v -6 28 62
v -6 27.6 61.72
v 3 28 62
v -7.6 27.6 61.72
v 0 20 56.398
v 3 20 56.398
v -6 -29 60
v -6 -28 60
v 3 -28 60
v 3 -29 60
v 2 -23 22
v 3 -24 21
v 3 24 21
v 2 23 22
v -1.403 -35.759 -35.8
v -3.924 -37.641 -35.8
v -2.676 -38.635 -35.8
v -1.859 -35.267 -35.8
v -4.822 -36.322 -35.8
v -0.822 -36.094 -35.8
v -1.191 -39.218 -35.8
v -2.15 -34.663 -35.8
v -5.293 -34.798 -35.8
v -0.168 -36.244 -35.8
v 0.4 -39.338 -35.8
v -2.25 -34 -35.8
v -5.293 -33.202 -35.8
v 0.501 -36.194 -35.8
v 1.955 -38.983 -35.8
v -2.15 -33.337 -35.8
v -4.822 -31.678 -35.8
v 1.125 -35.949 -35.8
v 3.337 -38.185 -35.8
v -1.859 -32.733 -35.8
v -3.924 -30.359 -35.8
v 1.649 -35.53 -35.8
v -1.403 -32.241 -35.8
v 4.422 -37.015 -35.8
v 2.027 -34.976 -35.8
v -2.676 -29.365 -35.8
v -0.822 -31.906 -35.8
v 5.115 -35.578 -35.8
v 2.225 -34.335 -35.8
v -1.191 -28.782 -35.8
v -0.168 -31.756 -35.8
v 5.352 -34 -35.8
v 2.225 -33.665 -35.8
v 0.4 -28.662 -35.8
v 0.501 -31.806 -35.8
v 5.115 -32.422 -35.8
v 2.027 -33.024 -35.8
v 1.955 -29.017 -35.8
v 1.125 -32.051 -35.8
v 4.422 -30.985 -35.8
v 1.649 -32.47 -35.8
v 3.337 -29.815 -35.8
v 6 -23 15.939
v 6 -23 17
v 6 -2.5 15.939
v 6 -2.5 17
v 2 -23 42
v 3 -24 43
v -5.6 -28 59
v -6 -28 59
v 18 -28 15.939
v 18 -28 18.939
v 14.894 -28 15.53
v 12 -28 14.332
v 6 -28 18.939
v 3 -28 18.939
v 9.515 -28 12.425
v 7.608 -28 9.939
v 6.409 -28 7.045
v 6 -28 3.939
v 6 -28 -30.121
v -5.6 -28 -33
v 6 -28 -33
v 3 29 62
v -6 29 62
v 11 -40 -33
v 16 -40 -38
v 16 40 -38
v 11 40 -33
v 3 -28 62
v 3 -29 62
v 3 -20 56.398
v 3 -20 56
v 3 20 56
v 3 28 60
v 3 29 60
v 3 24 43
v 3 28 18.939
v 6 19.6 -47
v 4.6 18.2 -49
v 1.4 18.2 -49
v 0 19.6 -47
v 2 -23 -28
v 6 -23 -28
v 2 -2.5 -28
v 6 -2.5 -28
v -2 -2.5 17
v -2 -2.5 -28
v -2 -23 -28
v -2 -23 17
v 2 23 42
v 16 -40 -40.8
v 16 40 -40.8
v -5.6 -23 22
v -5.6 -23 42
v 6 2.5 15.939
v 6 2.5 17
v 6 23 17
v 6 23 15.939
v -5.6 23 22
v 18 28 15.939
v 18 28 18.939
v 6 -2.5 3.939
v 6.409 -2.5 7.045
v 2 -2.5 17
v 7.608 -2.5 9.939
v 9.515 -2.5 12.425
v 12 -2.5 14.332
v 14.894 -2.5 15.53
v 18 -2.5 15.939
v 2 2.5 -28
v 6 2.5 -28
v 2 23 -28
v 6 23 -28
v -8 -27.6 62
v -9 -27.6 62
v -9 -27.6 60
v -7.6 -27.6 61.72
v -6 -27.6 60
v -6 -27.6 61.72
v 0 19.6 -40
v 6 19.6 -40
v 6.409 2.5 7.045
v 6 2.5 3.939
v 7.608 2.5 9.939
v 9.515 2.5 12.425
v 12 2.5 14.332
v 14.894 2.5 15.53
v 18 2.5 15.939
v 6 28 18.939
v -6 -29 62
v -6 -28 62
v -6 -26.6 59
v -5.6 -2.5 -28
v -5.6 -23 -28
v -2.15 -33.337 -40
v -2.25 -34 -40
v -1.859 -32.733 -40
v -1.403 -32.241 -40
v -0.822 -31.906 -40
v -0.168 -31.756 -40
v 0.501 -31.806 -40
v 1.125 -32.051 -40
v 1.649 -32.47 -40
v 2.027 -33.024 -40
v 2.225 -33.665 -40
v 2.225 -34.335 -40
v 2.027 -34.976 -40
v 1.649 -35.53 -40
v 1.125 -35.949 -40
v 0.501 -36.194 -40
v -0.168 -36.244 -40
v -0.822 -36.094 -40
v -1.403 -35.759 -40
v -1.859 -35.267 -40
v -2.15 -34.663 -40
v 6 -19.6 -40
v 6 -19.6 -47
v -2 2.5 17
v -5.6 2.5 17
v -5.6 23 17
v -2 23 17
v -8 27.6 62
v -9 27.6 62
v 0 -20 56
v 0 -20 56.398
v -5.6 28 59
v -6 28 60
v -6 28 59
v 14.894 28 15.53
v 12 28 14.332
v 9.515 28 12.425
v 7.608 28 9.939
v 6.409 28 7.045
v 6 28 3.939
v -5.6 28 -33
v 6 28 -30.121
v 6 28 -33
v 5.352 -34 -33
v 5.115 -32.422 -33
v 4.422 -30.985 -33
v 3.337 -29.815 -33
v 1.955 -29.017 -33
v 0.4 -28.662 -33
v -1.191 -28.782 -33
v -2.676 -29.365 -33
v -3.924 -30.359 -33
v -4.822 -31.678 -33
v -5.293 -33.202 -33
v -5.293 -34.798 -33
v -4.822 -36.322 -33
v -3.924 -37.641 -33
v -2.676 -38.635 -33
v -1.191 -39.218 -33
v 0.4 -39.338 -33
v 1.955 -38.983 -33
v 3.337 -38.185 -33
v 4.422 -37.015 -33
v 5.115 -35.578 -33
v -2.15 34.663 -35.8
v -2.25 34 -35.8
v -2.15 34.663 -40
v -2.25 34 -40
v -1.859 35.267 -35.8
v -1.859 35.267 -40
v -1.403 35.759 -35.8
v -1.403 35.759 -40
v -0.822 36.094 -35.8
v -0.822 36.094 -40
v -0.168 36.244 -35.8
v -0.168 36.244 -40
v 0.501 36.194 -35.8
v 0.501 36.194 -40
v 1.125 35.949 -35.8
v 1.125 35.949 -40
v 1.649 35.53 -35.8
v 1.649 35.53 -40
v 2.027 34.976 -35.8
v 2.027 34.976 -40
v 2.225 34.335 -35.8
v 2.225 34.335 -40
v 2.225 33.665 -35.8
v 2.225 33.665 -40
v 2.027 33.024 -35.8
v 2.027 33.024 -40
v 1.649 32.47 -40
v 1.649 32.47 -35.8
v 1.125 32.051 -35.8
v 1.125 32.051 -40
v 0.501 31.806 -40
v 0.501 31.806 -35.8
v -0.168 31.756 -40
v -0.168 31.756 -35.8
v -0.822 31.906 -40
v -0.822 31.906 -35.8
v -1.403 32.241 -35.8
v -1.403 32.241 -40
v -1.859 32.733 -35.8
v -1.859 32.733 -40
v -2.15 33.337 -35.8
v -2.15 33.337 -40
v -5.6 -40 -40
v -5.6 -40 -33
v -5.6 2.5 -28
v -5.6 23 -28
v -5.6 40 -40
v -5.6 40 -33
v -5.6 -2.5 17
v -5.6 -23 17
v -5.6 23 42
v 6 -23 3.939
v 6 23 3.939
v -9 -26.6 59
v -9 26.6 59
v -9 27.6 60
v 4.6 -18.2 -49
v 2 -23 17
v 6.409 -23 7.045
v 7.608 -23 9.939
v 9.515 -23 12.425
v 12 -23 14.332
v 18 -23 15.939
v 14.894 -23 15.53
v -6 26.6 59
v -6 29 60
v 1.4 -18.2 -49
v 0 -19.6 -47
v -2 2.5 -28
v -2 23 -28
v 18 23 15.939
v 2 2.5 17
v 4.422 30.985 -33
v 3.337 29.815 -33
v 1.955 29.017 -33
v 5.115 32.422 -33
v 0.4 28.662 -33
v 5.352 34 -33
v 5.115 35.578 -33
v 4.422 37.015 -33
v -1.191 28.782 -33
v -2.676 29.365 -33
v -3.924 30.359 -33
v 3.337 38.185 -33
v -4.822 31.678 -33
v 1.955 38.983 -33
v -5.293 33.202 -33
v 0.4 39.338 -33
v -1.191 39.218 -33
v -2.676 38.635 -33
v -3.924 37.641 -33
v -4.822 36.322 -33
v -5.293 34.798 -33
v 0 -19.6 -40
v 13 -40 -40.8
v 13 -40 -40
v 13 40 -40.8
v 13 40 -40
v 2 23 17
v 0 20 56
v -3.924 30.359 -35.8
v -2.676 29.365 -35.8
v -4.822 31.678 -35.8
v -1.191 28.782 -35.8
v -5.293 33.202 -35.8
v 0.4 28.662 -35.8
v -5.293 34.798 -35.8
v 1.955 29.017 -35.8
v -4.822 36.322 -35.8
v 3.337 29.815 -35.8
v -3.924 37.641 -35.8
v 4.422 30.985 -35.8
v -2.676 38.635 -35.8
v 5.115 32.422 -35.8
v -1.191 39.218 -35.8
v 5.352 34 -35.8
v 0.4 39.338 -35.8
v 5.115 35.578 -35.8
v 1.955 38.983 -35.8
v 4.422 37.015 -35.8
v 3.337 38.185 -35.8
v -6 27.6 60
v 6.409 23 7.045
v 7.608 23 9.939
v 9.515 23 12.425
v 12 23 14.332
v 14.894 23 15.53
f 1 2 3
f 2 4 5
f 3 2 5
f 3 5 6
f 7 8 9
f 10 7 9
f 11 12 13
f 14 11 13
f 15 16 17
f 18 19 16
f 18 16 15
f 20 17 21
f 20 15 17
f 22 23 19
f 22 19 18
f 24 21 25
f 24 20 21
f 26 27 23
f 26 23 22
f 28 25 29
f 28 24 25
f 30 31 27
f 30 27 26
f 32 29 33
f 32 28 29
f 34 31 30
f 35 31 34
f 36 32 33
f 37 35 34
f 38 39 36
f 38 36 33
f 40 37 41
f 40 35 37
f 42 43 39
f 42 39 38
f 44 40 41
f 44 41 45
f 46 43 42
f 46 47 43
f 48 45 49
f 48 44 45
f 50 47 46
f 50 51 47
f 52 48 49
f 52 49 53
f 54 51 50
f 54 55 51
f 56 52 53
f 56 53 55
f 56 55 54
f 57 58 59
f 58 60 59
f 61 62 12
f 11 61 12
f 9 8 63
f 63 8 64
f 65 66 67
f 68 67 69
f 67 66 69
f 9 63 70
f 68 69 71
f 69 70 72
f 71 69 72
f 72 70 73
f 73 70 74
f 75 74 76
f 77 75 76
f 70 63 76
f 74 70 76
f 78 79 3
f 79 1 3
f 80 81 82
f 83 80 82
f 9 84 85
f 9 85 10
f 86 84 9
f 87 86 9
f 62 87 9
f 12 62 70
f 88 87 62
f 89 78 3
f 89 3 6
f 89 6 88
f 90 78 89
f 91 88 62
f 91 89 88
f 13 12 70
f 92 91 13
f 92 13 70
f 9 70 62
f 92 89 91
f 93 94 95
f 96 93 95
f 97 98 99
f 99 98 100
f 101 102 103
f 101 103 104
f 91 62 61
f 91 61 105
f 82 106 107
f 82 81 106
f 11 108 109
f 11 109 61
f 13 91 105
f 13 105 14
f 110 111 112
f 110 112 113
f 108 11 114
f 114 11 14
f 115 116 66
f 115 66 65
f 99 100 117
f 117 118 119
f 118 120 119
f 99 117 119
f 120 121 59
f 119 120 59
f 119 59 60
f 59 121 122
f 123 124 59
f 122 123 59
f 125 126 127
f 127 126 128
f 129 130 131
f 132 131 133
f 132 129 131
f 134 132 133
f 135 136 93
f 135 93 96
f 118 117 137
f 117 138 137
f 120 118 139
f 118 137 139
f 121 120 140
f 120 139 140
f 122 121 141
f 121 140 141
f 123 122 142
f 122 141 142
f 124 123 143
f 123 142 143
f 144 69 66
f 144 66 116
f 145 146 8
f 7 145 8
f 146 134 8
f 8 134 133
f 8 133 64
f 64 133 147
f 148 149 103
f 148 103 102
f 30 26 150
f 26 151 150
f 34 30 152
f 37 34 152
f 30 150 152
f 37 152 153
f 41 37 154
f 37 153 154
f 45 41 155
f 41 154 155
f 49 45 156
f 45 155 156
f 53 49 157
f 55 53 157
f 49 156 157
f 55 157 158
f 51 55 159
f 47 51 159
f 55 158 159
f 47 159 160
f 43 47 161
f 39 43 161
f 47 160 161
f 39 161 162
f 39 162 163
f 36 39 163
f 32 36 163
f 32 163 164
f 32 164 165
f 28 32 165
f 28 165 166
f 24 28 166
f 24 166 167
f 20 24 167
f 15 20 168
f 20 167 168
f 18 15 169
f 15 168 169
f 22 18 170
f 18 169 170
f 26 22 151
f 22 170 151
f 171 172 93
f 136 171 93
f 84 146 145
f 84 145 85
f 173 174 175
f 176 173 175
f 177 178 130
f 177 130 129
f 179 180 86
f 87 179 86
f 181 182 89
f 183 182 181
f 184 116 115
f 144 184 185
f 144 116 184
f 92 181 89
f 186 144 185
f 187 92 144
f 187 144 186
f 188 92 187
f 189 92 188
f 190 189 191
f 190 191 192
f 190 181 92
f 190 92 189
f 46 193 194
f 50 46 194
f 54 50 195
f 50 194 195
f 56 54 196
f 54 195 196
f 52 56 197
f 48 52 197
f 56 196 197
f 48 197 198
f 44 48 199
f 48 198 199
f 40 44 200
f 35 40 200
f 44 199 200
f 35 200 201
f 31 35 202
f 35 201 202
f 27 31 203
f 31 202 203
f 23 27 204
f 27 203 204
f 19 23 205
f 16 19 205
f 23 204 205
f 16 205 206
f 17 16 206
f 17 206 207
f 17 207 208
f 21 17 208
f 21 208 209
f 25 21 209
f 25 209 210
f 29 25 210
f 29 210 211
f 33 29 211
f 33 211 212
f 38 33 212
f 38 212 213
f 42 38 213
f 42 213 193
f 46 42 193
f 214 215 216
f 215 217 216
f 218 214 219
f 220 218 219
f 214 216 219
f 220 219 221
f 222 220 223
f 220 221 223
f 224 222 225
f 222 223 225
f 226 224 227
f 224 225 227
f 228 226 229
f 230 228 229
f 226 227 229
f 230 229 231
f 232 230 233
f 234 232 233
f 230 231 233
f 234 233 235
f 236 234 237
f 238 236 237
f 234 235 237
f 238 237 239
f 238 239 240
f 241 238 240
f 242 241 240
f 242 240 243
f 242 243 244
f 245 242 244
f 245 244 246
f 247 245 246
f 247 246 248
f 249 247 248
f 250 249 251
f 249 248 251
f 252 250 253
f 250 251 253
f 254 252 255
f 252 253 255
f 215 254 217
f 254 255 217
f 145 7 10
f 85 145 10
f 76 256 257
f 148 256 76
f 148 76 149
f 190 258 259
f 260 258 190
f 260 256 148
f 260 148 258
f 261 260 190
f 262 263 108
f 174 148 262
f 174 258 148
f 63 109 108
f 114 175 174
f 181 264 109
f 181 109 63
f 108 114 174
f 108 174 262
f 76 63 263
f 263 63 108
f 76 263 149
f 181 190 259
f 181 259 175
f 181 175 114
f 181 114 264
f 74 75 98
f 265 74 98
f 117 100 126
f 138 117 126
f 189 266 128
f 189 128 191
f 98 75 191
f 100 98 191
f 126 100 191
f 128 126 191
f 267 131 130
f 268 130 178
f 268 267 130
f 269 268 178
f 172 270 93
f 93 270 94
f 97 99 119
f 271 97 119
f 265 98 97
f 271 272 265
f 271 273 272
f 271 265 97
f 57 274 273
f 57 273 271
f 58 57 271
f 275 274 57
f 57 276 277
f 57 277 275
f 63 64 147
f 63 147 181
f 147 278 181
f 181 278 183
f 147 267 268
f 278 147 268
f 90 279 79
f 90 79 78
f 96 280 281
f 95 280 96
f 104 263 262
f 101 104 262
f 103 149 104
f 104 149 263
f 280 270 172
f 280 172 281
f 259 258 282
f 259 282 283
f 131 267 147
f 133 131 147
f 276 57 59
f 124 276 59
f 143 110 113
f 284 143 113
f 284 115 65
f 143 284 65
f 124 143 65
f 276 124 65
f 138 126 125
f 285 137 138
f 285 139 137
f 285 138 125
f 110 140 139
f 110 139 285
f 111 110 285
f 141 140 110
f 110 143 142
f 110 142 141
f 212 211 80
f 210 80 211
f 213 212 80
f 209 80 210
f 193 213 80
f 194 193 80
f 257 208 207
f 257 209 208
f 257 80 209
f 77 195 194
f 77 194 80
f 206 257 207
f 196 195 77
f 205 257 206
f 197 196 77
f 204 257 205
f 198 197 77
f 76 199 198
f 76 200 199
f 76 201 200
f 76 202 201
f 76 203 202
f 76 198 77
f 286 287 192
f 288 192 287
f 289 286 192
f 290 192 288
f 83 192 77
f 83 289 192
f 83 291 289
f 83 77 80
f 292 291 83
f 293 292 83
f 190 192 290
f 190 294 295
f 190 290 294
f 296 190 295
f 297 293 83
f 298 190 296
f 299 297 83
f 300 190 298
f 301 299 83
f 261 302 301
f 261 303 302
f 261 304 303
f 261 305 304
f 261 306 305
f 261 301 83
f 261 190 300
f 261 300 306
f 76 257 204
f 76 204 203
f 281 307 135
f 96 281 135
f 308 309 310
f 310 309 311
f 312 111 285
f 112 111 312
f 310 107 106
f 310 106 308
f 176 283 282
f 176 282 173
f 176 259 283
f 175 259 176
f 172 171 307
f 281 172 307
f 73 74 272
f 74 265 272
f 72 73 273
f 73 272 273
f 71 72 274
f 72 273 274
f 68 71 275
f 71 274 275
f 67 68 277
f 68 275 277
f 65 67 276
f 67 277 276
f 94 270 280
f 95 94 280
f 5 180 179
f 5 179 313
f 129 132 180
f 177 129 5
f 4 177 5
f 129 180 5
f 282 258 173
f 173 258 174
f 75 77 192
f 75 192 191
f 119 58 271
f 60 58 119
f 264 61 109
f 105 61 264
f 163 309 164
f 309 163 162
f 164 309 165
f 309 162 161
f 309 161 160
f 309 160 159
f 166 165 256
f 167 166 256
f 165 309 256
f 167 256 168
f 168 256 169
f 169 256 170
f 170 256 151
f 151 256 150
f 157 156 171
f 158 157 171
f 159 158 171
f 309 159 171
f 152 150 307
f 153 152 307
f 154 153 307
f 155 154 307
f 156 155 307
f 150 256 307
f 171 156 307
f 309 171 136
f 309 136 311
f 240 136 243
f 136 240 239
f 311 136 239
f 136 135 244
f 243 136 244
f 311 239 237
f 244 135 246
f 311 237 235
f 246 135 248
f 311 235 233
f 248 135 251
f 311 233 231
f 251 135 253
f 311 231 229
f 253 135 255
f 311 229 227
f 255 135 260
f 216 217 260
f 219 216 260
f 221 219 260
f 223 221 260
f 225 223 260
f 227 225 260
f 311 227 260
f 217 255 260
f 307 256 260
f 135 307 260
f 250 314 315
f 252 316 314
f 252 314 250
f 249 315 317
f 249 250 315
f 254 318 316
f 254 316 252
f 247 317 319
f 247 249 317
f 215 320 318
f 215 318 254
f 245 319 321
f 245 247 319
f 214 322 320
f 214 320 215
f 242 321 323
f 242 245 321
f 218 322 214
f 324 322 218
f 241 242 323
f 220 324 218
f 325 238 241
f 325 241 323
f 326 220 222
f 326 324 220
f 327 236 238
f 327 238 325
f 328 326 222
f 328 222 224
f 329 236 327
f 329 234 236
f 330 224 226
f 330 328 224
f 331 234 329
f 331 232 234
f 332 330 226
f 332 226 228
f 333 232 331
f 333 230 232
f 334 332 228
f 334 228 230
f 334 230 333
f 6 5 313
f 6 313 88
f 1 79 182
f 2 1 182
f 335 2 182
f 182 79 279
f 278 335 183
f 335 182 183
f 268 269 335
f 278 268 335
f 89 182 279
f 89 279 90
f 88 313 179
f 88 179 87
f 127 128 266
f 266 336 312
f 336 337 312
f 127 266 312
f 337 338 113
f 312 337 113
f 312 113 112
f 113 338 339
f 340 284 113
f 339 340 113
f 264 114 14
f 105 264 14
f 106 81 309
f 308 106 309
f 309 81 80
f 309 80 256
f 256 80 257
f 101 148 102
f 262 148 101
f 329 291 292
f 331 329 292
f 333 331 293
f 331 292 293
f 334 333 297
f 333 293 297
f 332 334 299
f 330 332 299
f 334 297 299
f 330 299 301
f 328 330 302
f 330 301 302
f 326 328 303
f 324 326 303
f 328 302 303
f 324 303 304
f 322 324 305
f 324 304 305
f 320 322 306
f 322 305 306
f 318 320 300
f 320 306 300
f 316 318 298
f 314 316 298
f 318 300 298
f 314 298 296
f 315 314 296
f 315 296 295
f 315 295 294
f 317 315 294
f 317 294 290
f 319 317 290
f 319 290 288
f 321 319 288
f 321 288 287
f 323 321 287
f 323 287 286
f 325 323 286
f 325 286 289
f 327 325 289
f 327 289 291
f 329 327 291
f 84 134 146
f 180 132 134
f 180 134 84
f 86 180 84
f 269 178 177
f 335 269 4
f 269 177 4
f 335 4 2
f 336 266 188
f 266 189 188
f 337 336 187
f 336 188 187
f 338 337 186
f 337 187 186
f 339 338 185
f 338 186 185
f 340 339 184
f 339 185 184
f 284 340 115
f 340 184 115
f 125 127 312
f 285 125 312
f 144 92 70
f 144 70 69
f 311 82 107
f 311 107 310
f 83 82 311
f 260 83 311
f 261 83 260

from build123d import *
from OCP.BRepFilletAPI import BRepFilletAPI_MakeChamfer

# Parameters (mm, degrees)
SKETCH_1_W          = 12
SKETCH_1_H          = 46
EXTRUDE_1_DEPTH     = 59
SKETCH_2_W          = 20
SKETCH_2_H          = 46.080872769
CUT_EXTRUDE_1_DEPTH = 60
SKETCH_3_W          = 12
SKETCH_3_H          = 59
EXTRUDE_2_DEPTH     = 5
SKETCH_4_W          = 12
SKETCH_4_H          = 56
EXTRUDE_3_DEPTH     = 40
SKETCH_5_W          = 12
SKETCH_5_H          = 7
EXTRUDE_4_DEPTH     = 12
M4_A_1_D            = 4.5
M4_A_1_CBORE_D      = 10.705
M4_A_1_CBORE_DEPTH  = 2.8
SKETCH_8_W          = 15
SKETCH_8_H          = 56
EXTRUDE_5_DEPTH     = 3
SKETCH_9_W          = 6
SKETCH_9_H          = 40
CUT_EXTRUDE_2_DEPTH = 6
CHAMFER_1_SIZE      = 8
CHAMFER_1_SIZE_2    = 5.601660306
SKETCH_10_W         = 6
SKETCH_10_H         = 39.2
EXTRUDE_6_DEPTH     = 9
SKETCH_11_W         = 3
SKETCH_11_H         = 0.4
CUT_EXTRUDE_3_DEPTH = 119.330046903
CHAMFER_2_SIZE      = 1
CHAMFER_3_SIZE      = 2
CHAMFER_3_SIZE2     = 1.400415076
SKETCH_12_W         = 45
SKETCH_12_H         = 20.5
CUT_EXTRUDE_4_DEPTH = 4
SKETCH_14_W         = 7
SKETCH_14_H         = 80
EXTRUDE_7_DEPTH     = 10
CUT_EXTRUDE_5_DEPTH = 103.46950766
SKETCH_16_W         = 3
SKETCH_16_H         = 56
EXTRUDE_8_DEPTH     = 12
CHAMFER_5_SIZE      = 5
CUT_EXTRUDE_START   = -43.060641
SKETCH_17_W         = 3
SKETCH_17_H         = 56
CUT_EXTRUDE_6_DEPTH = 43.060641
CHAMFER_4_SIZE      = 1
FILLET_1_R          = 12
SKETCH_22_W         = 3
SKETCH_22_H         = 80
EXTRUDE_11_DEPTH    = 0.8
SKETCH_24_W         = 9
SKETCH_24_H         = 2
EXTRUDE_13_DEPTH    = 1
SKETCH_26_W         = 99
SKETCH_26_H         = 80
CUT_EXTRUDE_8_DEPTH = 0.4


with BuildPart() as part:
    # 스케치1 → 보스-돌출1 (new body)
    with BuildSketch(Plane.XY):
        Rectangle(SKETCH_1_W, SKETCH_1_H)
    extrude(amount=EXTRUDE_1_DEPTH)

    # 스케치2 → 컷-돌출1 (cut)
    with BuildSketch(Plane(origin=(6, 0, 0), x_dir=(0, 0, -1), z_dir=(1, 0, 0))):
        with Locations((-32, 0.040436385)):
            Rectangle(SKETCH_2_W, SKETCH_2_H)
    extrude(amount=-CUT_EXTRUDE_1_DEPTH, mode=Mode.SUBTRACT)


with BuildPart() as cut_extrude_1_piece_1:
    # of the separate pieces the step leaves, piece 1, a body of its own (cut_extrude_1_pieces)
    add(part.part.solids().sort_by_distance((-6, 23, 0))[0])



with BuildPart() as cut_extrude_1_piece_2:
    # of the separate pieces the step leaves, piece 2, a body of its own (cut_extrude_1_pieces)
    add(part.part.solids().sort_by_distance((6, 23, 42))[0])


with BuildPart() as cut_extrude_1_piece_1_1:
    add(cut_extrude_1_piece_1.part)

    add(cut_extrude_1_piece_2.part)  # 보스-돌출2 merges 컷-돌출1 piece 2
    # 스케치3 → 보스-돌출2 (add)
    with BuildSketch(Plane.XZ.offset(23)):
        with Locations((0, 29.5)):
            Rectangle(SKETCH_3_W, SKETCH_3_H)
    extrude_2 = extrude(amount=EXTRUDE_2_DEPTH)

    # 대칭 복사1: 보스-돌출2 across plane
    add(extrude_2.mirror(Plane.ZX))

    # 스케치4 → 보스-돌출3 (add)
    with BuildSketch(Plane(origin=(0, 0, 0), x_dir=(-1, 0, 0), z_dir=(0, 0, -1))):
        Rectangle(SKETCH_4_W, SKETCH_4_H)
    extrude(amount=EXTRUDE_3_DEPTH)

    # 스케치5 → 보스-돌출4 (add)
    with BuildSketch(Plane.XZ.offset(28)):
        with Locations((0, -36.5)):
            Rectangle(SKETCH_5_W, SKETCH_5_H)
    extrude_4 = extrude(amount=EXTRUDE_4_DEPTH)

    # 대칭 복사2: 보스-돌출4 across plane
    add(extrude_4.mirror(Plane.ZX))

    # M4 육각 머리 볼트용 카운터보어 (A 등급)1 (through all)
    with Locations(Plane.XY.offset(-33)):
        with Locations((0, -34), (0, 34)):
            CounterBoreHole(M4_A_1_D / 2, M4_A_1_CBORE_D / 2, M4_A_1_CBORE_DEPTH)

    # 스케치8 → 보스-돌출5 (add)
    with BuildSketch(Plane.XY.offset(59)):
        with Locations((-1.5, 0)):
            Rectangle(SKETCH_8_W, SKETCH_8_H)
    extrude(amount=EXTRUDE_5_DEPTH)

    # 스케치9 → 컷-돌출2 (cut)
    with BuildSketch(Plane.XY.offset(62)):
        with Locations((3, 0)):
            Rectangle(SKETCH_9_W, SKETCH_9_H)
    extrude(amount=-CUT_EXTRUDE_2_DEPTH, mode=Mode.SUBTRACT)

    # 모따기1
    chamfer_1_edges_1 = [cut_extrude_1_piece_1_1.edges().sort_by_distance(p)[0] for p in [
        (0, 0, 62),
    ]]
    chamfer_1_side_1 = [cut_extrude_1_piece_1_1.faces().sort_by_distance(p)[0] for p in [
        (-0.112033206, 0, 62),
    ]]
    chamfer_1_edges_2 = [cut_extrude_1_piece_1_1.edges().sort_by_distance(p)[0] for p in [
        (3, 20, 62),
    ]]
    chamfer_1_side_2 = [cut_extrude_1_piece_1_1.faces().sort_by_distance(p)[0] for p in [
        (3, 20.112033206, 62),
    ]]
    chamfer_1_edges_3 = [cut_extrude_1_piece_1_1.edges().sort_by_distance(p)[0] for p in [
        (3, -20, 62),
    ]]
    chamfer_1_side_3 = [cut_extrude_1_piece_1_1.faces().sort_by_distance(p)[0] for p in [
        (3, -20.112033206, 62),
    ]]
    chamfer_1 = BRepFilletAPI_MakeChamfer(cut_extrude_1_piece_1_1.part.solid().wrapped)
    for e in chamfer_1_edges_1:
        chamfer_1.Add(CHAMFER_1_SIZE - 0.0001, CHAMFER_1_SIZE_2 - 0.0001, e.wrapped, chamfer_1_side_1[0].wrapped)
    for e in chamfer_1_edges_2:
        chamfer_1.Add(CHAMFER_1_SIZE - 0.0001, CHAMFER_1_SIZE_2 - 0.0001, e.wrapped, chamfer_1_side_2[0].wrapped)
    for e in chamfer_1_edges_3:
        chamfer_1.Add(CHAMFER_1_SIZE - 0.0001, CHAMFER_1_SIZE_2 - 0.0001, e.wrapped, chamfer_1_side_3[0].wrapped)
    add(Compound.cast(chamfer_1.Shape()), mode=Mode.REPLACE)  # a hair under: the kernel refuses the full size

    # 스케치10 → 보스-돌출6 (add)
    with BuildSketch(Plane(origin=(0, 0, -40), x_dir=(-1, 0, 0), z_dir=(0, 0, -1))):
        with Locations((-3, 0)):
            Rectangle(SKETCH_10_W, SKETCH_10_H)
    extrude(amount=EXTRUDE_6_DEPTH)

    # 스케치11 → 컷-돌출3 (cut, through all)
    with BuildSketch(Plane.XY.offset(62)):
        with Locations((-7.5, 27.8)):
            Rectangle(SKETCH_11_W, SKETCH_11_H)
        with Locations((-7.5, -27.8)):
            Rectangle(SKETCH_11_W, SKETCH_11_H)
    extrude(amount=-CUT_EXTRUDE_3_DEPTH, mode=Mode.SUBTRACT)


with BuildPart() as cut_extrude_3_kept_piece:
    # of the separate pieces the step leaves, the one the design keeps (cut_extrude_3_pieces_kept)
    add(cut_extrude_1_piece_1_1.part.solids().sort_by_distance((6, -27.9999, 62))[0])

    # 모따기2
    chamfer_2_edges = [cut_extrude_3_kept_piece.edges().sort_by_distance(p)[0] for p in [
        (-7.5, -27.6, 59),
        (-7.5, 27.6, 59),
    ]]
    chamfer(chamfer_2_edges, length=CHAMFER_2_SIZE)

    # 모따기3: one chamfer whose edges measure the first distance from different faces: ONE call of the kernel's chamfer builder (chamfer() names one face for all edges)
    chamfer_3_edges_1 = [cut_extrude_3_kept_piece.edges().sort_by_distance(p)[0] for p in [
        (6, 0, -49),
    ]]
    chamfer_3_side_1 = [cut_extrude_3_kept_piece.faces().sort_by_distance(p)[0] for p in [
        (6, 0, -1.052959329),
    ]]
    chamfer_3_edges_2 = [cut_extrude_3_kept_piece.edges().sort_by_distance(p)[0] for p in [
        (3, -19.6, -49),
    ]]
    chamfer_3_side_2 = [cut_extrude_3_kept_piece.faces().sort_by_distance(p)[0] for p in [
        (3, -19.6, -44.5),
    ]]
    chamfer_3_edges_3 = [cut_extrude_3_kept_piece.edges().sort_by_distance(p)[0] for p in [
        (0, 0, -49),
    ]]
    chamfer_3_side_3 = [cut_extrude_3_kept_piece.faces().sort_by_distance(p)[0] for p in [
        (0, 0, -44.5),
    ]]
    chamfer_3_edges_4 = [cut_extrude_3_kept_piece.edges().sort_by_distance(p)[0] for p in [
        (3, 19.6, -49),
    ]]
    chamfer_3_side_4 = [cut_extrude_3_kept_piece.faces().sort_by_distance(p)[0] for p in [
        (3, 19.6, -44.5),
    ]]
    chamfer_3 = BRepFilletAPI_MakeChamfer(cut_extrude_3_kept_piece.part.solid().wrapped)
    for e in chamfer_3_edges_1:
        chamfer_3.Add(CHAMFER_3_SIZE, CHAMFER_3_SIZE2, e.wrapped, chamfer_3_side_1[0].wrapped)  # the first distance lies on this face
    for e in chamfer_3_edges_2:
        chamfer_3.Add(CHAMFER_3_SIZE, CHAMFER_3_SIZE2, e.wrapped, chamfer_3_side_2[0].wrapped)  # the first distance lies on this face
    for e in chamfer_3_edges_3:
        chamfer_3.Add(CHAMFER_3_SIZE, CHAMFER_3_SIZE2, e.wrapped, chamfer_3_side_3[0].wrapped)  # the first distance lies on this face
    for e in chamfer_3_edges_4:
        chamfer_3.Add(CHAMFER_3_SIZE, CHAMFER_3_SIZE2, e.wrapped, chamfer_3_side_4[0].wrapped)  # the first distance lies on this face
    add(Compound.cast(chamfer_3.Shape()), mode=Mode.REPLACE)

    # 스케치12 → 컷-돌출4 (cut)
    with BuildSketch(Plane.ZY.offset(6)):
        with Locations((-5.5, 12.75)):
            Rectangle(SKETCH_12_W, SKETCH_12_H)
        with Locations((-5.5, -12.75)):
            Rectangle(SKETCH_12_W, SKETCH_12_H)
    cut_extrude_4 = extrude(amount=-CUT_EXTRUDE_4_DEPTH, mode=Mode.SUBTRACT)

    # 대칭 복사3: 컷-돌출4 across plane
    add(cut_extrude_4.mirror(Plane.ZY), mode=Mode.SUBTRACT)

    # 스케치14 → 보스-돌출7 (add)
    with BuildSketch(Plane(origin=(6, 0, 0), x_dir=(0, 0, -1), z_dir=(1, 0, 0))):
        with Locations((36.5, 0)):
            Rectangle(SKETCH_14_W, SKETCH_14_H)
    extrude(amount=EXTRUDE_7_DEPTH)

    # 스케치15 → 컷-돌출5 (cut, through all)
    with BuildSketch(Plane.XZ.offset(40)):
        with BuildLine():
            Line((6, -33), (16, -33))
            Line((16, -33), (16, -28.353890031))
            add(Edge.make_bspline(
                [(6, -33), (5.579283, -24.005465365), (9.542787604, -28.181394392), (15.145388019, -28.353890031), (16, -28.353890031)],
                knots=[0, 0, 0, 0, 0.752787833, 1, 1, 1, 1], degree=3))
        make_face()
    extrude(amount=-CUT_EXTRUDE_5_DEPTH, mode=Mode.SUBTRACT)

    # 스케치16 → 보스-돌출8 (add)
    with BuildSketch(Plane(origin=(6, 0, 0), x_dir=(0, 0, -1), z_dir=(1, 0, 0))):
        with Locations((-17.43935887, 0)):
            Rectangle(SKETCH_16_W, SKETCH_16_H)
    extrude(amount=EXTRUDE_8_DEPTH)

    # 모따기5
    chamfer_5_edges = [cut_extrude_3_kept_piece.edges().sort_by_distance(p)[0] for p in [
        (16, 0, -33),
    ]]
    chamfer(chamfer_5_edges, length=CHAMFER_5_SIZE)

    # 스케치17 → 컷-돌출6 (cut)
    with BuildSketch(Plane.XY.offset(62).offset(CUT_EXTRUDE_START)):
        with Locations((4.5, 0)):
            Rectangle(SKETCH_17_W, SKETCH_17_H)
    extrude(amount=CUT_EXTRUDE_6_DEPTH, mode=Mode.SUBTRACT)

    # 모따기4
    chamfer_4_edges = [cut_extrude_3_kept_piece.edges().sort_by_distance(p)[0] for p in [
        (3, -23, 32),
        (3, 23, 32),
        (3, 0, 22),
        (3, 0, 42),
    ]]
    chamfer(chamfer_4_edges, length=CHAMFER_4_SIZE)

    # 필렛1
    fillet_1_edges = [cut_extrude_3_kept_piece.edges().sort_by_distance(p)[0] for p in [
        (6, -25.5, 15.93935887),
        (6, 0, 15.93935887),
        (6, 25.5, 15.93935887),
    ]]
    fillet(fillet_1_edges, radius=FILLET_1_R - 0.0001)  # a hair under: the kernel refuses the full size

    # 스케치22 → 보스-돌출11 (add)
    with BuildSketch(Plane(origin=(0, 0, -40), x_dir=(-1, 0, 0), z_dir=(0, 0, -1))):
        with Locations((-14.5, 0)):
            Rectangle(SKETCH_22_W, SKETCH_22_H)
    extrude(amount=EXTRUDE_11_DEPTH)

    # 스케치24 → 보스-돌출13 (add)
    with BuildSketch(Plane(origin=(0, 28, 0), x_dir=(1, 0, 0), z_dir=(0, 1, 0))):
        with Locations((-1.5, -61)):
            Rectangle(SKETCH_24_W, SKETCH_24_H)
    extrude_13 = extrude(amount=EXTRUDE_13_DEPTH)

    # 대칭 복사4: 보스-돌출13 across plane
    add(extrude_13.mirror(Plane.ZX))

    # 스케치26 → 컷-돌출8 (cut)
    with BuildSketch(Plane.ZY.offset(6)):
        with Locations((9.5, 0)):
            Rectangle(SKETCH_26_W, SKETCH_26_H)
    extrude(amount=-CUT_EXTRUDE_8_DEPTH, mode=Mode.SUBTRACT)


solid = cut_extrude_3_kept_piece.part
